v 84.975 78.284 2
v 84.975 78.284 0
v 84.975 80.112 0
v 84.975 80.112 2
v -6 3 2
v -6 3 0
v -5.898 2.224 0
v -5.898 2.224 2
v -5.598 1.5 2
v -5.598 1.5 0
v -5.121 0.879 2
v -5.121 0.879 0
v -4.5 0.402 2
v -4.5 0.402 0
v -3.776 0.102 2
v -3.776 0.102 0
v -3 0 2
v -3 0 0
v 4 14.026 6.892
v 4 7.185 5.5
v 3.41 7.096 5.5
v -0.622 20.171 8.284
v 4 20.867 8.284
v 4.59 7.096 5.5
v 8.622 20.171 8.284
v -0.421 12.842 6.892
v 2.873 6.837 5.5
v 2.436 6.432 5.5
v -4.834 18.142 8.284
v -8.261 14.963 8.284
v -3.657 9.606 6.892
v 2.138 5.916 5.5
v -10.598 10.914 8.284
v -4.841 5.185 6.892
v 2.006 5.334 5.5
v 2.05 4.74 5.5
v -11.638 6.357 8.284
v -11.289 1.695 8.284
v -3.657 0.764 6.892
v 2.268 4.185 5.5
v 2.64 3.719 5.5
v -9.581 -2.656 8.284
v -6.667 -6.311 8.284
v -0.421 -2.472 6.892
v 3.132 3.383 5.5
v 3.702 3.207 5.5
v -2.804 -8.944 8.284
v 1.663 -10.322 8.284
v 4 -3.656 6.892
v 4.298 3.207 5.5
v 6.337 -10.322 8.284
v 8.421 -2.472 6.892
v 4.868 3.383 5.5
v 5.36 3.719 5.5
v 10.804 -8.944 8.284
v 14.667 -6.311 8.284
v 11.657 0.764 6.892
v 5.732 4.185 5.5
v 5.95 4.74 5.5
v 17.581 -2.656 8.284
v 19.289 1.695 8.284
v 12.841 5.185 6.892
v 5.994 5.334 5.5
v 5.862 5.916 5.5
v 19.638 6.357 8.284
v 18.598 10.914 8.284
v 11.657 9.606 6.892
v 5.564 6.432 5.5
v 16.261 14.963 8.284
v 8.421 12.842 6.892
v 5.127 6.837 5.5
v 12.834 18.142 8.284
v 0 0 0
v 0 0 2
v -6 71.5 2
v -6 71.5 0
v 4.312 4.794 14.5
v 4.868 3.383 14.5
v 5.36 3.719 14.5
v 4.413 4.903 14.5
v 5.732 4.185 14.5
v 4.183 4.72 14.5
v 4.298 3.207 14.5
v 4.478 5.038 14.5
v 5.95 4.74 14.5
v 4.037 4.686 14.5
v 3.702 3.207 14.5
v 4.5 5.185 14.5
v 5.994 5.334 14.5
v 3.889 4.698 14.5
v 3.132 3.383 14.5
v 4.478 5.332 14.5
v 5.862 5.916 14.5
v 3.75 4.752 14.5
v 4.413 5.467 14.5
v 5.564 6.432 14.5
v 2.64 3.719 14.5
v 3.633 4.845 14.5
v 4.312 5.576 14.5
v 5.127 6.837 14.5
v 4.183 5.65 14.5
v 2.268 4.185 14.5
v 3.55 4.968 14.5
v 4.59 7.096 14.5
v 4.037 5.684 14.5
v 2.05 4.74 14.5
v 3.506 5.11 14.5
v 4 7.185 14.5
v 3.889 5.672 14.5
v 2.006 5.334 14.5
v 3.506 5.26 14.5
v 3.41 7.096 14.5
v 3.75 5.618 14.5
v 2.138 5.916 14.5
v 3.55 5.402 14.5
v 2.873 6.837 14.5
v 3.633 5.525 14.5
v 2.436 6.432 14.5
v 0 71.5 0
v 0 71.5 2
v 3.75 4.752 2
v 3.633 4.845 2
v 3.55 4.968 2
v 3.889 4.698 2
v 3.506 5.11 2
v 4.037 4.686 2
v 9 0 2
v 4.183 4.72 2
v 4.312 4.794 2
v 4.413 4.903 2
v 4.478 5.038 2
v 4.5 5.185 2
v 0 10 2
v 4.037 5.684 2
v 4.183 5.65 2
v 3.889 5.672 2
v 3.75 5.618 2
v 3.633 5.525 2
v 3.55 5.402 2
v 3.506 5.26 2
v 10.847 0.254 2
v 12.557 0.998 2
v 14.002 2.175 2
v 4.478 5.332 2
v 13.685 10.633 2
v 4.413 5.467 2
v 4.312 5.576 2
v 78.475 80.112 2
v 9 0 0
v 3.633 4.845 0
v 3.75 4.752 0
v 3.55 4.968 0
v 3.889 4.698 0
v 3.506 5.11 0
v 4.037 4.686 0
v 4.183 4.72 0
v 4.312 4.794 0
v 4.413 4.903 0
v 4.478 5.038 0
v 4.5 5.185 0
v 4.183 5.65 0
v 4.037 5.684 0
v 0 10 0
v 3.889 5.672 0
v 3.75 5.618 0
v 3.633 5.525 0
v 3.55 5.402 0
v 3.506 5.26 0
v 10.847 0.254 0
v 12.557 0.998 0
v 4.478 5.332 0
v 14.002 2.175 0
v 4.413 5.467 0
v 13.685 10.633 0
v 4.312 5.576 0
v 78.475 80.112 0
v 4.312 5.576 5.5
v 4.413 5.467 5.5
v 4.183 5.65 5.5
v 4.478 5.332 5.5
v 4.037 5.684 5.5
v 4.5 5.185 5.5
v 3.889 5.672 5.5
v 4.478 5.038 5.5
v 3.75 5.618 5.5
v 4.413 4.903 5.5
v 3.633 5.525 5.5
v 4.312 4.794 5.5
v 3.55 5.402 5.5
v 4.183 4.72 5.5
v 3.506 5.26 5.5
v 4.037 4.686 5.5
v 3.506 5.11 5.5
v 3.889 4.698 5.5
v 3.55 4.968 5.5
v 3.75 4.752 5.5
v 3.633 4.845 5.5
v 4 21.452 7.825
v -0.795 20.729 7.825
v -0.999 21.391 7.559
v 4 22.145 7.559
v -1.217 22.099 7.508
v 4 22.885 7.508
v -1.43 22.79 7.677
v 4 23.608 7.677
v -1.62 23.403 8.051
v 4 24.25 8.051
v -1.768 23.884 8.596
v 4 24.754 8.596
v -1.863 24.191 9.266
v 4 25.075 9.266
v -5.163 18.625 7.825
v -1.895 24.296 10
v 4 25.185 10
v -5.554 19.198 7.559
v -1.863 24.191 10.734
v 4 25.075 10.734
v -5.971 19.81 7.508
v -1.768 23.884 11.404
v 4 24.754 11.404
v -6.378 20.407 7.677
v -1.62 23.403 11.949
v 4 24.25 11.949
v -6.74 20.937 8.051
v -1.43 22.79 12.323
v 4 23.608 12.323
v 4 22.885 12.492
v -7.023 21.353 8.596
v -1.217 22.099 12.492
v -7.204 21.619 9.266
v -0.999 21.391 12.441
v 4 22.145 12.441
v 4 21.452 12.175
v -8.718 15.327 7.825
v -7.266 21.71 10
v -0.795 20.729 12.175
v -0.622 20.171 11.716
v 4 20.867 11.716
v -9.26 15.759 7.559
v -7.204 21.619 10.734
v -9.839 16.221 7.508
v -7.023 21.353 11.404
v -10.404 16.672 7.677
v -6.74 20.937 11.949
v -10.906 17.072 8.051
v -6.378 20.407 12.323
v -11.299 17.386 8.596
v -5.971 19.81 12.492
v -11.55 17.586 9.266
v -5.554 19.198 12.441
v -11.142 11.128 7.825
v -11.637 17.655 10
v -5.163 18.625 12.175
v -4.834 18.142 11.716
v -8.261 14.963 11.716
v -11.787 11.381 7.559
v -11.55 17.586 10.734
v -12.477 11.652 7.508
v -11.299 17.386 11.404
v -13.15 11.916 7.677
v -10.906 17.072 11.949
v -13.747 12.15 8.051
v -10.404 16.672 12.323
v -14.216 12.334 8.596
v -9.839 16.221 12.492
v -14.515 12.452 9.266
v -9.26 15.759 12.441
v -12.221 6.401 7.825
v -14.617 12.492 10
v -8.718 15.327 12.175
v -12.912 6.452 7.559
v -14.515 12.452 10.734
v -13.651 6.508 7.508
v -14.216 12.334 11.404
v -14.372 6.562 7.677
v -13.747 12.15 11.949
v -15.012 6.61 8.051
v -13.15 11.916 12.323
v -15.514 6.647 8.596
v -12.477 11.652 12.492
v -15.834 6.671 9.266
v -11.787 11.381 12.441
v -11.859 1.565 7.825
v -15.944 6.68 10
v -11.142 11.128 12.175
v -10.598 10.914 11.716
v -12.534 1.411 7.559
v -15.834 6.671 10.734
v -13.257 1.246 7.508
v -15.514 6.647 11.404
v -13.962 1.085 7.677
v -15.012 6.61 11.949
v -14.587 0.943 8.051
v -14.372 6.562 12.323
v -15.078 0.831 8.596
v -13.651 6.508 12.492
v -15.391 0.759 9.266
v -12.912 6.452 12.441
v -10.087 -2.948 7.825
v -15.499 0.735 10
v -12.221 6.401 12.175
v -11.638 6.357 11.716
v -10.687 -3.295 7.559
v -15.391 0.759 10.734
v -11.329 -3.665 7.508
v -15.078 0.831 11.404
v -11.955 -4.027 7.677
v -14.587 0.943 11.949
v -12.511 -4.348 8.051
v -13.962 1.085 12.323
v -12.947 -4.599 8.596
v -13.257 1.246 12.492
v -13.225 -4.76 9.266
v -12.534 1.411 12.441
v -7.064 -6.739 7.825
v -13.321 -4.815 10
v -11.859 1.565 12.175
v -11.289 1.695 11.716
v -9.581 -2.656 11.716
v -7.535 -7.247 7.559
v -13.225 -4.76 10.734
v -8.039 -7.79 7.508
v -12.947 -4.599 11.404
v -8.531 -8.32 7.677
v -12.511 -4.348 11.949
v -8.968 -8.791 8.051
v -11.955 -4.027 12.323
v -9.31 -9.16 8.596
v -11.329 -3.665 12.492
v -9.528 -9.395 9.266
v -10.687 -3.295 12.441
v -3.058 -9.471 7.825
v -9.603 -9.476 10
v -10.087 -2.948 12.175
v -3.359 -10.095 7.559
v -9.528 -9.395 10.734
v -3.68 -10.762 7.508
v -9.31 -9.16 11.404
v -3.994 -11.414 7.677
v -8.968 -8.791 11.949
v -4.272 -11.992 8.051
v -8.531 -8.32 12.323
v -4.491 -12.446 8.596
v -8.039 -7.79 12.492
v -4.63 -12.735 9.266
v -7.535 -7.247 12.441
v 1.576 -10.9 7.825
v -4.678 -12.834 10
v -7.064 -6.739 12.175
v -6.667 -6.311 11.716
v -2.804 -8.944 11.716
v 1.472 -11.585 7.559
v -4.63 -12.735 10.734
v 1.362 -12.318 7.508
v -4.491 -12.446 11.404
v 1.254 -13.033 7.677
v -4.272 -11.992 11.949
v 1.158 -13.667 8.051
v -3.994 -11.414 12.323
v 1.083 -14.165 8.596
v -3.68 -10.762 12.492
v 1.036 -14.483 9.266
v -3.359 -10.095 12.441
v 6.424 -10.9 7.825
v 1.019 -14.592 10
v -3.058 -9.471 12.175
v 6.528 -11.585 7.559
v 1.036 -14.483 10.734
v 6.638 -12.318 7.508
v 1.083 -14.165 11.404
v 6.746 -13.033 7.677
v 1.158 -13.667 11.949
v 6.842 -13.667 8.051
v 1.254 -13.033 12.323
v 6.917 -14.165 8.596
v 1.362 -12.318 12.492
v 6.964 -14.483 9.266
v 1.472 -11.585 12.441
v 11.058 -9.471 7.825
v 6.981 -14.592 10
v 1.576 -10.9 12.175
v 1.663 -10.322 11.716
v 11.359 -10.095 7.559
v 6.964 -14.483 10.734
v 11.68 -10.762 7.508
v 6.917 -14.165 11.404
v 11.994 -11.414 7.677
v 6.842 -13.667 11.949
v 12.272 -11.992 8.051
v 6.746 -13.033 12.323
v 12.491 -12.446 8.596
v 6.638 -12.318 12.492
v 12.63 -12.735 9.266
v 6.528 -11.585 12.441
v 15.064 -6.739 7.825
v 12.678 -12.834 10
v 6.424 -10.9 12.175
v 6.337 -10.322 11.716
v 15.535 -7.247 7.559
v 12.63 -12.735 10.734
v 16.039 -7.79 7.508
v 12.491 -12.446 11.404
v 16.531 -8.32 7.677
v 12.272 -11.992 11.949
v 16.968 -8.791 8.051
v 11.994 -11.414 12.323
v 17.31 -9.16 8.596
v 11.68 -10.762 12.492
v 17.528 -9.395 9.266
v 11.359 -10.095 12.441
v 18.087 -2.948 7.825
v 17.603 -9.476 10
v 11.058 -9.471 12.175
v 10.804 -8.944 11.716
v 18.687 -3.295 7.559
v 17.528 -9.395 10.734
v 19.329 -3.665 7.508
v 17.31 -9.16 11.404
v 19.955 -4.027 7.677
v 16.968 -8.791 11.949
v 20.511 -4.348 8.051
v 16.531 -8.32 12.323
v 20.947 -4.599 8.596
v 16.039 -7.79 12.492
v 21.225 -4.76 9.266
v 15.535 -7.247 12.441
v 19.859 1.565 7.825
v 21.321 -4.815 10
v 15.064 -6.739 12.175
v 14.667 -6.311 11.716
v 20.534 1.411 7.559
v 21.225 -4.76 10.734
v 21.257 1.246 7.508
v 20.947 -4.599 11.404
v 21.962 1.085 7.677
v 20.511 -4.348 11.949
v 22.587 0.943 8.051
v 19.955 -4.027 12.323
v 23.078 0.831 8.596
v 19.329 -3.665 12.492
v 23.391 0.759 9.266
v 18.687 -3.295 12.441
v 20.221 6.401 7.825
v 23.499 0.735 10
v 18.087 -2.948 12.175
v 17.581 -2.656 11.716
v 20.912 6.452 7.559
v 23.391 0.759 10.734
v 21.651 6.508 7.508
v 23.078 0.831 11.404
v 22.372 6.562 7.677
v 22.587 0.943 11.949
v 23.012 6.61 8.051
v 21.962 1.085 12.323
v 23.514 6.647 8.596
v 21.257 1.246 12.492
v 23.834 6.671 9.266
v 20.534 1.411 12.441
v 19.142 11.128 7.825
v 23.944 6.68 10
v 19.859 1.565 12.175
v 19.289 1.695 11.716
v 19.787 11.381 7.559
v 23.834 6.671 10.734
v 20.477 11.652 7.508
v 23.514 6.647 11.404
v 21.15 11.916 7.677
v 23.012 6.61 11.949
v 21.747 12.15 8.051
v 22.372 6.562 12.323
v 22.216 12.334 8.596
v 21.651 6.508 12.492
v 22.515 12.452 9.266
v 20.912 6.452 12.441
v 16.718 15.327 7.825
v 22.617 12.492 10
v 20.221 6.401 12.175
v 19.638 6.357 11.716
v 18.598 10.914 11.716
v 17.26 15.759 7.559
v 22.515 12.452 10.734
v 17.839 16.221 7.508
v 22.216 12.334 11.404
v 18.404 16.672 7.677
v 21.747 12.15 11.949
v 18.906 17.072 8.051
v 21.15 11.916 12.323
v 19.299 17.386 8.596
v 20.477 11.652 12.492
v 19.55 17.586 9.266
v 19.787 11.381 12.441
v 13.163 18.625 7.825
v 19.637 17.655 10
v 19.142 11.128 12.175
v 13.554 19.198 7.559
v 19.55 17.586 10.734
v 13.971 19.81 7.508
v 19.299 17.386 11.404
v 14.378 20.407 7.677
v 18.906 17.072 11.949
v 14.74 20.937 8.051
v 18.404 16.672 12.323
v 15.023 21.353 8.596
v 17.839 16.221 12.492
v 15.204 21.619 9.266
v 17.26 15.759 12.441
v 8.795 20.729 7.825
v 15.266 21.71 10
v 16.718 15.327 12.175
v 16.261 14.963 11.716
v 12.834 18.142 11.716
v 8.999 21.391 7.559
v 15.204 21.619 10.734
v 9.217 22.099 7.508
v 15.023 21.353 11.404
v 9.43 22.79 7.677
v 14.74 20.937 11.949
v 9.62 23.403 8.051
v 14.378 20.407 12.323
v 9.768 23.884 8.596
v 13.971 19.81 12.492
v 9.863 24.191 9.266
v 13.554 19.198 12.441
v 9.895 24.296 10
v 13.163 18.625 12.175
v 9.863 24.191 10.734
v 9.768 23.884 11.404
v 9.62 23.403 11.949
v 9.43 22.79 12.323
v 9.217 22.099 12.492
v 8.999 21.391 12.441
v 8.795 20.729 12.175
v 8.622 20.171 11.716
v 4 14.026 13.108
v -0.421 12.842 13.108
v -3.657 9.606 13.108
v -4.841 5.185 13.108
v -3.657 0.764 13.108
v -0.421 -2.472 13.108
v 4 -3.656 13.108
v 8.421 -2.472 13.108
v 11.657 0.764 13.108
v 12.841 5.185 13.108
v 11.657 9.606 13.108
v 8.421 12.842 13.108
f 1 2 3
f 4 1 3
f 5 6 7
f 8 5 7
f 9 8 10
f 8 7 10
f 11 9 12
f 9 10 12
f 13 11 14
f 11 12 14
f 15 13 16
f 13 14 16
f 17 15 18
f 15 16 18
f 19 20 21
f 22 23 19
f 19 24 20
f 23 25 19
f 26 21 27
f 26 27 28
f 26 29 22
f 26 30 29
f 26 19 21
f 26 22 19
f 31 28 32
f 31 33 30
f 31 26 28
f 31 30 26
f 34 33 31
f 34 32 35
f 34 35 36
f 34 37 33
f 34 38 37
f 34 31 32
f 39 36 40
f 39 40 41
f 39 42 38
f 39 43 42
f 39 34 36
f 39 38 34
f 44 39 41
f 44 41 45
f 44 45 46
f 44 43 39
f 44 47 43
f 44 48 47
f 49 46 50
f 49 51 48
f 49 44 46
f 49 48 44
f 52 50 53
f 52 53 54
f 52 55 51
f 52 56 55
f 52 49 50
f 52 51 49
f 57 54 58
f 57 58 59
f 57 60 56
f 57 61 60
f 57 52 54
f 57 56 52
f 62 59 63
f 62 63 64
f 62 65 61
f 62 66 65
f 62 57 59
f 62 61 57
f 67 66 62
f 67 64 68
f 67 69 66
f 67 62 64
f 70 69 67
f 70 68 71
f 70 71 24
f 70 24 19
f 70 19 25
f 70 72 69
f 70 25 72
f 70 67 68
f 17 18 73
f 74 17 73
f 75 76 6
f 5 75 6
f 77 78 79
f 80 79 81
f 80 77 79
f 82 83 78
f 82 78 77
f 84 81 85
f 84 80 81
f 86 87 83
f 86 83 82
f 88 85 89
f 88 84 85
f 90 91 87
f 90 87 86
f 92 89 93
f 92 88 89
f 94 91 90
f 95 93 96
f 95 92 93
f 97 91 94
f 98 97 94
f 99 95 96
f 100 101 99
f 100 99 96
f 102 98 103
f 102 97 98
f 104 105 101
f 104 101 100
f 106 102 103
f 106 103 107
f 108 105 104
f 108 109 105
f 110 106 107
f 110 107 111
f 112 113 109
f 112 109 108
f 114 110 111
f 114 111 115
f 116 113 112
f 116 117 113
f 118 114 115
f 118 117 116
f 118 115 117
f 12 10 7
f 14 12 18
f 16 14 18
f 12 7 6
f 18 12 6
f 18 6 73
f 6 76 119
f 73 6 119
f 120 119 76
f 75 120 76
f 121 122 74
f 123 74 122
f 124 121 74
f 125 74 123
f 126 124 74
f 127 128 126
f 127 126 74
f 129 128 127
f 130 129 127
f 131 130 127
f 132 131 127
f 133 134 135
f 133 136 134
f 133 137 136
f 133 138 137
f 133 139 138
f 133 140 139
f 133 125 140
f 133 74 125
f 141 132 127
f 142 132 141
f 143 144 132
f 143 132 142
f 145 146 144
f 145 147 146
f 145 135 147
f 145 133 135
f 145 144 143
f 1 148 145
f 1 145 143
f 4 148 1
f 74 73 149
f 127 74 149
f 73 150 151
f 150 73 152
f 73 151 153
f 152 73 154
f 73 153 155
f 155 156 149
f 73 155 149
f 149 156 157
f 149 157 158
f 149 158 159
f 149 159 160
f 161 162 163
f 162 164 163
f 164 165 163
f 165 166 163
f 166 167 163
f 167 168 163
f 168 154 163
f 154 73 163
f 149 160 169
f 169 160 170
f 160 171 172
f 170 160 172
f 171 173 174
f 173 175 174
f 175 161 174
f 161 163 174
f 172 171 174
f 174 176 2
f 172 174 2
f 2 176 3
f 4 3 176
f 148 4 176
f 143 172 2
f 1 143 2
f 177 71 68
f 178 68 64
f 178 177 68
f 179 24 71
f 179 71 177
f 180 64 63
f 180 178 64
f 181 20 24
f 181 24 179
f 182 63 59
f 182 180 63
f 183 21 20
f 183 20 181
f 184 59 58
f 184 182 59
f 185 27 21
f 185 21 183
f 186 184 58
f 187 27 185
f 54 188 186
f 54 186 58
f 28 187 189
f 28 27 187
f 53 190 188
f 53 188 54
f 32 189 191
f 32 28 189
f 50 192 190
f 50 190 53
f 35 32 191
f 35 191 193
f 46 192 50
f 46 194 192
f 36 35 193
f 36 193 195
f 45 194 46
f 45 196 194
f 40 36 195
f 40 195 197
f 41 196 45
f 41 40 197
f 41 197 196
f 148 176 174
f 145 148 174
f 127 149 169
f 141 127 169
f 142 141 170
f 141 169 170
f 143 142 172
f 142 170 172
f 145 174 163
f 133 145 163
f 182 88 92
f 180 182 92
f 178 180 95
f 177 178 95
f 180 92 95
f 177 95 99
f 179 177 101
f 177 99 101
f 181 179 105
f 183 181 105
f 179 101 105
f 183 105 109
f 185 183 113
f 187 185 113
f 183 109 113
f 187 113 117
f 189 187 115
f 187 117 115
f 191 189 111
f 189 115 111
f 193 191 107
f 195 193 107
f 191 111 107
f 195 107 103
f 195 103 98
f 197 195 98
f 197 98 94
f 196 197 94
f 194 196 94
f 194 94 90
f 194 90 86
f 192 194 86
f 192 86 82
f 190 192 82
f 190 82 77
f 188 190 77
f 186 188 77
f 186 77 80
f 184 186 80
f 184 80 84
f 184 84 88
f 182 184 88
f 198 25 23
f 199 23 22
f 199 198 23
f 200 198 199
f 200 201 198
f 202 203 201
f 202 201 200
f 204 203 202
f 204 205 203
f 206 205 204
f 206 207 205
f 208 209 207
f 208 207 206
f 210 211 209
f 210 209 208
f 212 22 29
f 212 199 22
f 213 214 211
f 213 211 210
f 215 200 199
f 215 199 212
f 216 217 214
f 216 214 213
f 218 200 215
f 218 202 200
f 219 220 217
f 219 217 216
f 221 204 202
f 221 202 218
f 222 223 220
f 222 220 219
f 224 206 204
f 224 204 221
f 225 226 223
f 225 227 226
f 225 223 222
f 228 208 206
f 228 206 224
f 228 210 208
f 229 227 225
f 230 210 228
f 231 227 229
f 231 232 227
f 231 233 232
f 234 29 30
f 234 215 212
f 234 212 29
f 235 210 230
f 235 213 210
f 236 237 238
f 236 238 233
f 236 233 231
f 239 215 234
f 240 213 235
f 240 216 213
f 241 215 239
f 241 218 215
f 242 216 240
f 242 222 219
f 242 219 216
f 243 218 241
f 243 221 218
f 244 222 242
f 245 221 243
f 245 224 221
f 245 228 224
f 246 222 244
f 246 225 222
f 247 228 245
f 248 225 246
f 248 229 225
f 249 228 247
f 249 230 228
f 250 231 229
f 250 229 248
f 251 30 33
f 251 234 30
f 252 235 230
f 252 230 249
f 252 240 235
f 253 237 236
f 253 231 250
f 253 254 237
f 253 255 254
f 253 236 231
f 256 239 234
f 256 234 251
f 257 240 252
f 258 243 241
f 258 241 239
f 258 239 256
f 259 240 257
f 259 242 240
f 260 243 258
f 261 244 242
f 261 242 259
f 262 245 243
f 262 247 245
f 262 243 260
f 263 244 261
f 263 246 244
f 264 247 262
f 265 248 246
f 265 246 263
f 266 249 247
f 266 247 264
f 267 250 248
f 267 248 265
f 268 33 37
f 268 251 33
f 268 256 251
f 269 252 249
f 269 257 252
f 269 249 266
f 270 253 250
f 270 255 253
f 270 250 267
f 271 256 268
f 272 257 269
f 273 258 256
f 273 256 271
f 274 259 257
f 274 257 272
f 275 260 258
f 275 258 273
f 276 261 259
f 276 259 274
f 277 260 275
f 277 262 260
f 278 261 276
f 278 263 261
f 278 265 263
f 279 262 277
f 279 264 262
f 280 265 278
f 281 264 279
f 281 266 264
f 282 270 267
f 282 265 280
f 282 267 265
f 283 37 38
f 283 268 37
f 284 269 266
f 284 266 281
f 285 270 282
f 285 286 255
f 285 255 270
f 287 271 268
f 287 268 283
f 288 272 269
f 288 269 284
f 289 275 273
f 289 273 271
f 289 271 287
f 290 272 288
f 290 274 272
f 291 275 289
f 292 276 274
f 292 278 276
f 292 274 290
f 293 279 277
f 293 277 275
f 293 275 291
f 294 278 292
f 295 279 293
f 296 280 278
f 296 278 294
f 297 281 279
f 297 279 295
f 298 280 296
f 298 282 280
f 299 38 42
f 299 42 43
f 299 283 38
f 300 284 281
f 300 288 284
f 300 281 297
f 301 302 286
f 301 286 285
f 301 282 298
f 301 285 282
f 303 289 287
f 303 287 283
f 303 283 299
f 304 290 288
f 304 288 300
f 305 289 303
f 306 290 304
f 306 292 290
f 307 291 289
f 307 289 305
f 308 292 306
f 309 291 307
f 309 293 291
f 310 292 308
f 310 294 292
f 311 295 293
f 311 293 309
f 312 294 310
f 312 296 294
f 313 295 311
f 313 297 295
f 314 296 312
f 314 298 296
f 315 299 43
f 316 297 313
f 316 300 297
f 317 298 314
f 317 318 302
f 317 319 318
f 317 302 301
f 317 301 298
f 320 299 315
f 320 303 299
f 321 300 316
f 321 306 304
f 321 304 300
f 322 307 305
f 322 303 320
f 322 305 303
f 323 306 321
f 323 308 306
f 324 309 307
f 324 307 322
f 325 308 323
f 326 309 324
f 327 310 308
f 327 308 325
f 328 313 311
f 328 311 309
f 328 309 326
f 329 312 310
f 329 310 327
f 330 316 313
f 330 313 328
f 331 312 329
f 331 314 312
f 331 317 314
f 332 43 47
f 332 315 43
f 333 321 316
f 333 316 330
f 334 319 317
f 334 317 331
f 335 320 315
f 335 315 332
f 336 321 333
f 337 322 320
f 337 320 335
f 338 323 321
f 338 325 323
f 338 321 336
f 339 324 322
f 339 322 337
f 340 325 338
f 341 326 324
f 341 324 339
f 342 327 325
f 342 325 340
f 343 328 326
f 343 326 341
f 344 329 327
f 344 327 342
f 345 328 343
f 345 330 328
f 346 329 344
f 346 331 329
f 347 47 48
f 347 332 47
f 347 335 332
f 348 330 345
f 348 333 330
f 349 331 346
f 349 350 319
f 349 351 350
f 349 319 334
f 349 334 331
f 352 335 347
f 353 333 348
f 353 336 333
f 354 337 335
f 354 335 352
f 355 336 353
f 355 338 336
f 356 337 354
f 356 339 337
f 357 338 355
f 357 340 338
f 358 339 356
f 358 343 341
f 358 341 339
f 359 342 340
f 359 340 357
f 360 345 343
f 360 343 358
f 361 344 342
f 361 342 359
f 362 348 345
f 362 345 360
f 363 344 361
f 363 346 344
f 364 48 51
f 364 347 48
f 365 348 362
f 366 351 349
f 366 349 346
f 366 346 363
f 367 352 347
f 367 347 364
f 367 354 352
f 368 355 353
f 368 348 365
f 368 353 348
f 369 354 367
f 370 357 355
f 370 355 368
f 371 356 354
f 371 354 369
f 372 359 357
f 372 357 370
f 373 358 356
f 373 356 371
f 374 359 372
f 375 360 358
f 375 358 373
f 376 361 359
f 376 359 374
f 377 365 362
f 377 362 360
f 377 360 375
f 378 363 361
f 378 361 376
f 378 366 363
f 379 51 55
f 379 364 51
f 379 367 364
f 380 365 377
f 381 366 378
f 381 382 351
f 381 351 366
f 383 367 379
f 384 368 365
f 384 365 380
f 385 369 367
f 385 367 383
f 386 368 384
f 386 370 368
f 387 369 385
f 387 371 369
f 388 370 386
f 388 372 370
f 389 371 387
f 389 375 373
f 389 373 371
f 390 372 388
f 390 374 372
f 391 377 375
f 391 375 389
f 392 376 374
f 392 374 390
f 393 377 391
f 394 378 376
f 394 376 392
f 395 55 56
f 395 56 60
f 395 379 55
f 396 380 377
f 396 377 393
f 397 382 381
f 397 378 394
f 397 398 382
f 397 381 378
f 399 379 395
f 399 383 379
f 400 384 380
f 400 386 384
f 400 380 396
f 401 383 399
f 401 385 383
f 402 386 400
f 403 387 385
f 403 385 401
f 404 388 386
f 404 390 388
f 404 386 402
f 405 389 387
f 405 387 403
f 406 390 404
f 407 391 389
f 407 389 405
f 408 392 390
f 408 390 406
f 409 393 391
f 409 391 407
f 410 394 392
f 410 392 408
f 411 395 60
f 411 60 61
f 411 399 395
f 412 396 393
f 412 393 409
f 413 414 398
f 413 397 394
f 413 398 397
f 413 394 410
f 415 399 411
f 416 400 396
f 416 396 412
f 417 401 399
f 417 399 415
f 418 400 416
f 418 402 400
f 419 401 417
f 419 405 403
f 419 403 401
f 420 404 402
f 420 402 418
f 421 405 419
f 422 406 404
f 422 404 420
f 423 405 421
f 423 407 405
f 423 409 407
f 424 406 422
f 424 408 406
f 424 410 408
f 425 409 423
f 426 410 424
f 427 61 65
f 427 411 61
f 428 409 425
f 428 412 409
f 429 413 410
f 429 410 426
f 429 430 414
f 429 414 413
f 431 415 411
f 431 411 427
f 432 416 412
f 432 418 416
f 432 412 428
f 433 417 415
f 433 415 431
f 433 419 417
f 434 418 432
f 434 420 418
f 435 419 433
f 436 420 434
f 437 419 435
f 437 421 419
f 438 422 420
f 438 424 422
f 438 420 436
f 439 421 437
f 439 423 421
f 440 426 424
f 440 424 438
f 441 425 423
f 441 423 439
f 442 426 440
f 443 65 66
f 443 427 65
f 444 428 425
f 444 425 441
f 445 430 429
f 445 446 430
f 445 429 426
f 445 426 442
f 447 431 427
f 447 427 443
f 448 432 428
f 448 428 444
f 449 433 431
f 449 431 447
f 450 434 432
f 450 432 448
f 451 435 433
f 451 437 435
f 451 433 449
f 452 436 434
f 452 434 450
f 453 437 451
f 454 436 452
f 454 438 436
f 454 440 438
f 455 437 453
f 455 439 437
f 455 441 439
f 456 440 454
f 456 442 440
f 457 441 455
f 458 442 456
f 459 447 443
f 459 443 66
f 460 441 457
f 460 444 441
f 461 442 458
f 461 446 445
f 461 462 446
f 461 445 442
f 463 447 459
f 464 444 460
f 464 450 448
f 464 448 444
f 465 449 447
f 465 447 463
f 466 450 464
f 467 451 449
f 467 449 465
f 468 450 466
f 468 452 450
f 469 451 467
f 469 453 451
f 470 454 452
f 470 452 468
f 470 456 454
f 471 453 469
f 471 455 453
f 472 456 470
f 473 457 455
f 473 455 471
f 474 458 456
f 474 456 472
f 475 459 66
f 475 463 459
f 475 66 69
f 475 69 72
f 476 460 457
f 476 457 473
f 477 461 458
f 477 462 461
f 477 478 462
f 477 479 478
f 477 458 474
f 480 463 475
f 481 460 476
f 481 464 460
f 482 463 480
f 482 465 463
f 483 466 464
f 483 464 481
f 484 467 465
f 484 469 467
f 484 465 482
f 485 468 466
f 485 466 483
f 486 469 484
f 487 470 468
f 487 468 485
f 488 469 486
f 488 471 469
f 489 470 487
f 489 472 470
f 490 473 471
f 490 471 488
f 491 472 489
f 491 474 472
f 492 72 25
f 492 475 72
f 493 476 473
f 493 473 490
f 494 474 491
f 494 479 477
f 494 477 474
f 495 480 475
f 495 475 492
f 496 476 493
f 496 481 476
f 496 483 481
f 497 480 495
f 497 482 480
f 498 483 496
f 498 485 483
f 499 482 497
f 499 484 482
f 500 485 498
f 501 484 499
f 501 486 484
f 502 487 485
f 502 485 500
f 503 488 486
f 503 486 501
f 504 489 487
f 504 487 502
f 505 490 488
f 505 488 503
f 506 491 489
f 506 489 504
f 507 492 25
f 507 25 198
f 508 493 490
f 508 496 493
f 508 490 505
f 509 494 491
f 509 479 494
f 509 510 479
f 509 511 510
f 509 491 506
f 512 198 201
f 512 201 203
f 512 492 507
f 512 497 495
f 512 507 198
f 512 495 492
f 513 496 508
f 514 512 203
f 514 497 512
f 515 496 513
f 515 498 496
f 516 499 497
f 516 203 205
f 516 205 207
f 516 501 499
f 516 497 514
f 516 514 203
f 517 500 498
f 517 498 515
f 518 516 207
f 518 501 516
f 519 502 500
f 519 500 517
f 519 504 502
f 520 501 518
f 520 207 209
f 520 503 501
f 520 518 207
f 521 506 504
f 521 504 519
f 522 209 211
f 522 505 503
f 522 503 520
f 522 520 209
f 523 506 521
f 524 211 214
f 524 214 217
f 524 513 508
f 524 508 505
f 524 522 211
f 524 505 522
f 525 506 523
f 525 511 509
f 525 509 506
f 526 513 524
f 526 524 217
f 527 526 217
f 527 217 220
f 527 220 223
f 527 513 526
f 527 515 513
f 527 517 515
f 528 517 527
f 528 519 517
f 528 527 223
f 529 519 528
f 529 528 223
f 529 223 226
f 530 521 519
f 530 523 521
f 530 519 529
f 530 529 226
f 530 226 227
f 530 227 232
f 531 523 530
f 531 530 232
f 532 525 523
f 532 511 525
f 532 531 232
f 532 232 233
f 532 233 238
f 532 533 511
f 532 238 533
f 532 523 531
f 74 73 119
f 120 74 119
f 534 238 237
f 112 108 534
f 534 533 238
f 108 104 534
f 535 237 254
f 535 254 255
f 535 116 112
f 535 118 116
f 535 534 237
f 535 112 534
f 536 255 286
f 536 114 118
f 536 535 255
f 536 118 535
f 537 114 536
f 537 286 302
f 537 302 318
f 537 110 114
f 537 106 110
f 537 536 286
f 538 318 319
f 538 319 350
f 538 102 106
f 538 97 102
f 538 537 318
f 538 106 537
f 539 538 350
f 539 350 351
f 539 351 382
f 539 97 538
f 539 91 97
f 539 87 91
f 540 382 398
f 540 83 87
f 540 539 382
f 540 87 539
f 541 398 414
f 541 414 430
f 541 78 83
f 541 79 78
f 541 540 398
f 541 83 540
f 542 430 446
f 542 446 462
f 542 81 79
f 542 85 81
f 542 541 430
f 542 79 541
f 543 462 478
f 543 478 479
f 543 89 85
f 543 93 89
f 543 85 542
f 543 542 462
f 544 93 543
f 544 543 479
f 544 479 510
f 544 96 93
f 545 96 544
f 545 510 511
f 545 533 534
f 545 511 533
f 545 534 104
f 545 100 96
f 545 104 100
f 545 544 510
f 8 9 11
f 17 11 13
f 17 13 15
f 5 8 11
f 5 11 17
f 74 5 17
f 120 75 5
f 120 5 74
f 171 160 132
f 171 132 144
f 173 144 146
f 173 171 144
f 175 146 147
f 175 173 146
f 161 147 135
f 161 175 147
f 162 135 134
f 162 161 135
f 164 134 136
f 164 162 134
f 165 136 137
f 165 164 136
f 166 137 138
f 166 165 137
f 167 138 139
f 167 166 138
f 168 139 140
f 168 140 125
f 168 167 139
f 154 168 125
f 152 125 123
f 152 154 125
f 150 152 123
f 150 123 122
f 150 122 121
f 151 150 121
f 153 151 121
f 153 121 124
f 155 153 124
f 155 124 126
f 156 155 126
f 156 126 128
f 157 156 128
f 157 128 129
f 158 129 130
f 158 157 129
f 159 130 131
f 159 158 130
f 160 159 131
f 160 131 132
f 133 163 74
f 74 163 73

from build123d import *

# Parameters (mm, degrees)
F0_R     = 0.5
F1_DEPTH = 2
F2_DEPTH = 2
F7_R     = 0.5
F8_DEPTH = 25


with BuildPart() as f1:
    # F0 (on Top) → F1 (new body)
    with BuildSketch(Plane.XY):
        with BuildLine():
            Line((0, 10), (0, 0))
            Line((0, 0), (9, 0))
            ThreePointArc((9, 0), (11.7273010219, 0.5672794284), (14.002197756, 2.1750174863))
            Line((14.002197756, 2.1750174863), (84.9752155788, 78.2842610556))
            Line((84.9752155788, 78.2842610556), (84.9752155788, 80.1115395542))
            Line((84.9752155788, 80.1115395542), (78.4752155788, 80.1115395542))
            Line((78.4752155788, 80.1115395542), (13.6853713729, 10.6329379004))
            Line((13.6853713729, 10.6329379004), (0, 10))
        make_face()
        with Locations((4, 5.1849969236)):
            Circle(F0_R, mode=Mode.SUBTRACT)
    extrude(amount=F1_DEPTH)


with BuildPart() as f2:
    # F0 (on Top) → F2 (new body)
    with BuildSketch(Plane.XY):
        with BuildLine():
            Line((-3, 0), (0, 0))
            Line((0, 0), (0, 10))
            Line((0, 10), (0, 71.5))
            Line((0, 71.5), (-6, 71.5))
            Line((-6, 71.5), (-6, 3))
            ThreePointArc((-6, 3), (-5.1213203436, 0.8786796564), (-3, 0))
        make_face()
    extrude(amount=F2_DEPTH)


with BuildPart() as f6:
    # F5 (on plane+point) → F6 (revolve)
    with BuildSketch(Plane.YZ.offset(4)):
        with BuildLine():
            Line((7.1849969236, 5.5), (20.8672357266, 8.2836829457))
            ThreePointArc((20.8672357266, 8.2836829457), (25.1849969236, 10), (20.8672357266, 11.7163170543))
            Line((20.8672357266, 11.7163170543), (7.1849969236, 14.5))
            Line((7.1849969236, 14.5), (5.1849969236, 14.5))
            Line((5.1849969236, 14.5), (5.1849969236, 5.5))
            Line((5.1849969236, 5.5), (7.1849969236, 5.5))
        make_face()
    revolve(axis=Axis((4, 5.1849969236, 10), (0, 0, 1)))

    # F7 (on face) → F8 (cut)
    with BuildSketch(Plane.XY.offset(14.5)):
        with Locations((4, 5.1849969236)):
            Circle(F7_R)
    extrude(amount=-F8_DEPTH, mode=Mode.SUBTRACT)


solid = Compound([f1.part, f2.part, f6.part])
